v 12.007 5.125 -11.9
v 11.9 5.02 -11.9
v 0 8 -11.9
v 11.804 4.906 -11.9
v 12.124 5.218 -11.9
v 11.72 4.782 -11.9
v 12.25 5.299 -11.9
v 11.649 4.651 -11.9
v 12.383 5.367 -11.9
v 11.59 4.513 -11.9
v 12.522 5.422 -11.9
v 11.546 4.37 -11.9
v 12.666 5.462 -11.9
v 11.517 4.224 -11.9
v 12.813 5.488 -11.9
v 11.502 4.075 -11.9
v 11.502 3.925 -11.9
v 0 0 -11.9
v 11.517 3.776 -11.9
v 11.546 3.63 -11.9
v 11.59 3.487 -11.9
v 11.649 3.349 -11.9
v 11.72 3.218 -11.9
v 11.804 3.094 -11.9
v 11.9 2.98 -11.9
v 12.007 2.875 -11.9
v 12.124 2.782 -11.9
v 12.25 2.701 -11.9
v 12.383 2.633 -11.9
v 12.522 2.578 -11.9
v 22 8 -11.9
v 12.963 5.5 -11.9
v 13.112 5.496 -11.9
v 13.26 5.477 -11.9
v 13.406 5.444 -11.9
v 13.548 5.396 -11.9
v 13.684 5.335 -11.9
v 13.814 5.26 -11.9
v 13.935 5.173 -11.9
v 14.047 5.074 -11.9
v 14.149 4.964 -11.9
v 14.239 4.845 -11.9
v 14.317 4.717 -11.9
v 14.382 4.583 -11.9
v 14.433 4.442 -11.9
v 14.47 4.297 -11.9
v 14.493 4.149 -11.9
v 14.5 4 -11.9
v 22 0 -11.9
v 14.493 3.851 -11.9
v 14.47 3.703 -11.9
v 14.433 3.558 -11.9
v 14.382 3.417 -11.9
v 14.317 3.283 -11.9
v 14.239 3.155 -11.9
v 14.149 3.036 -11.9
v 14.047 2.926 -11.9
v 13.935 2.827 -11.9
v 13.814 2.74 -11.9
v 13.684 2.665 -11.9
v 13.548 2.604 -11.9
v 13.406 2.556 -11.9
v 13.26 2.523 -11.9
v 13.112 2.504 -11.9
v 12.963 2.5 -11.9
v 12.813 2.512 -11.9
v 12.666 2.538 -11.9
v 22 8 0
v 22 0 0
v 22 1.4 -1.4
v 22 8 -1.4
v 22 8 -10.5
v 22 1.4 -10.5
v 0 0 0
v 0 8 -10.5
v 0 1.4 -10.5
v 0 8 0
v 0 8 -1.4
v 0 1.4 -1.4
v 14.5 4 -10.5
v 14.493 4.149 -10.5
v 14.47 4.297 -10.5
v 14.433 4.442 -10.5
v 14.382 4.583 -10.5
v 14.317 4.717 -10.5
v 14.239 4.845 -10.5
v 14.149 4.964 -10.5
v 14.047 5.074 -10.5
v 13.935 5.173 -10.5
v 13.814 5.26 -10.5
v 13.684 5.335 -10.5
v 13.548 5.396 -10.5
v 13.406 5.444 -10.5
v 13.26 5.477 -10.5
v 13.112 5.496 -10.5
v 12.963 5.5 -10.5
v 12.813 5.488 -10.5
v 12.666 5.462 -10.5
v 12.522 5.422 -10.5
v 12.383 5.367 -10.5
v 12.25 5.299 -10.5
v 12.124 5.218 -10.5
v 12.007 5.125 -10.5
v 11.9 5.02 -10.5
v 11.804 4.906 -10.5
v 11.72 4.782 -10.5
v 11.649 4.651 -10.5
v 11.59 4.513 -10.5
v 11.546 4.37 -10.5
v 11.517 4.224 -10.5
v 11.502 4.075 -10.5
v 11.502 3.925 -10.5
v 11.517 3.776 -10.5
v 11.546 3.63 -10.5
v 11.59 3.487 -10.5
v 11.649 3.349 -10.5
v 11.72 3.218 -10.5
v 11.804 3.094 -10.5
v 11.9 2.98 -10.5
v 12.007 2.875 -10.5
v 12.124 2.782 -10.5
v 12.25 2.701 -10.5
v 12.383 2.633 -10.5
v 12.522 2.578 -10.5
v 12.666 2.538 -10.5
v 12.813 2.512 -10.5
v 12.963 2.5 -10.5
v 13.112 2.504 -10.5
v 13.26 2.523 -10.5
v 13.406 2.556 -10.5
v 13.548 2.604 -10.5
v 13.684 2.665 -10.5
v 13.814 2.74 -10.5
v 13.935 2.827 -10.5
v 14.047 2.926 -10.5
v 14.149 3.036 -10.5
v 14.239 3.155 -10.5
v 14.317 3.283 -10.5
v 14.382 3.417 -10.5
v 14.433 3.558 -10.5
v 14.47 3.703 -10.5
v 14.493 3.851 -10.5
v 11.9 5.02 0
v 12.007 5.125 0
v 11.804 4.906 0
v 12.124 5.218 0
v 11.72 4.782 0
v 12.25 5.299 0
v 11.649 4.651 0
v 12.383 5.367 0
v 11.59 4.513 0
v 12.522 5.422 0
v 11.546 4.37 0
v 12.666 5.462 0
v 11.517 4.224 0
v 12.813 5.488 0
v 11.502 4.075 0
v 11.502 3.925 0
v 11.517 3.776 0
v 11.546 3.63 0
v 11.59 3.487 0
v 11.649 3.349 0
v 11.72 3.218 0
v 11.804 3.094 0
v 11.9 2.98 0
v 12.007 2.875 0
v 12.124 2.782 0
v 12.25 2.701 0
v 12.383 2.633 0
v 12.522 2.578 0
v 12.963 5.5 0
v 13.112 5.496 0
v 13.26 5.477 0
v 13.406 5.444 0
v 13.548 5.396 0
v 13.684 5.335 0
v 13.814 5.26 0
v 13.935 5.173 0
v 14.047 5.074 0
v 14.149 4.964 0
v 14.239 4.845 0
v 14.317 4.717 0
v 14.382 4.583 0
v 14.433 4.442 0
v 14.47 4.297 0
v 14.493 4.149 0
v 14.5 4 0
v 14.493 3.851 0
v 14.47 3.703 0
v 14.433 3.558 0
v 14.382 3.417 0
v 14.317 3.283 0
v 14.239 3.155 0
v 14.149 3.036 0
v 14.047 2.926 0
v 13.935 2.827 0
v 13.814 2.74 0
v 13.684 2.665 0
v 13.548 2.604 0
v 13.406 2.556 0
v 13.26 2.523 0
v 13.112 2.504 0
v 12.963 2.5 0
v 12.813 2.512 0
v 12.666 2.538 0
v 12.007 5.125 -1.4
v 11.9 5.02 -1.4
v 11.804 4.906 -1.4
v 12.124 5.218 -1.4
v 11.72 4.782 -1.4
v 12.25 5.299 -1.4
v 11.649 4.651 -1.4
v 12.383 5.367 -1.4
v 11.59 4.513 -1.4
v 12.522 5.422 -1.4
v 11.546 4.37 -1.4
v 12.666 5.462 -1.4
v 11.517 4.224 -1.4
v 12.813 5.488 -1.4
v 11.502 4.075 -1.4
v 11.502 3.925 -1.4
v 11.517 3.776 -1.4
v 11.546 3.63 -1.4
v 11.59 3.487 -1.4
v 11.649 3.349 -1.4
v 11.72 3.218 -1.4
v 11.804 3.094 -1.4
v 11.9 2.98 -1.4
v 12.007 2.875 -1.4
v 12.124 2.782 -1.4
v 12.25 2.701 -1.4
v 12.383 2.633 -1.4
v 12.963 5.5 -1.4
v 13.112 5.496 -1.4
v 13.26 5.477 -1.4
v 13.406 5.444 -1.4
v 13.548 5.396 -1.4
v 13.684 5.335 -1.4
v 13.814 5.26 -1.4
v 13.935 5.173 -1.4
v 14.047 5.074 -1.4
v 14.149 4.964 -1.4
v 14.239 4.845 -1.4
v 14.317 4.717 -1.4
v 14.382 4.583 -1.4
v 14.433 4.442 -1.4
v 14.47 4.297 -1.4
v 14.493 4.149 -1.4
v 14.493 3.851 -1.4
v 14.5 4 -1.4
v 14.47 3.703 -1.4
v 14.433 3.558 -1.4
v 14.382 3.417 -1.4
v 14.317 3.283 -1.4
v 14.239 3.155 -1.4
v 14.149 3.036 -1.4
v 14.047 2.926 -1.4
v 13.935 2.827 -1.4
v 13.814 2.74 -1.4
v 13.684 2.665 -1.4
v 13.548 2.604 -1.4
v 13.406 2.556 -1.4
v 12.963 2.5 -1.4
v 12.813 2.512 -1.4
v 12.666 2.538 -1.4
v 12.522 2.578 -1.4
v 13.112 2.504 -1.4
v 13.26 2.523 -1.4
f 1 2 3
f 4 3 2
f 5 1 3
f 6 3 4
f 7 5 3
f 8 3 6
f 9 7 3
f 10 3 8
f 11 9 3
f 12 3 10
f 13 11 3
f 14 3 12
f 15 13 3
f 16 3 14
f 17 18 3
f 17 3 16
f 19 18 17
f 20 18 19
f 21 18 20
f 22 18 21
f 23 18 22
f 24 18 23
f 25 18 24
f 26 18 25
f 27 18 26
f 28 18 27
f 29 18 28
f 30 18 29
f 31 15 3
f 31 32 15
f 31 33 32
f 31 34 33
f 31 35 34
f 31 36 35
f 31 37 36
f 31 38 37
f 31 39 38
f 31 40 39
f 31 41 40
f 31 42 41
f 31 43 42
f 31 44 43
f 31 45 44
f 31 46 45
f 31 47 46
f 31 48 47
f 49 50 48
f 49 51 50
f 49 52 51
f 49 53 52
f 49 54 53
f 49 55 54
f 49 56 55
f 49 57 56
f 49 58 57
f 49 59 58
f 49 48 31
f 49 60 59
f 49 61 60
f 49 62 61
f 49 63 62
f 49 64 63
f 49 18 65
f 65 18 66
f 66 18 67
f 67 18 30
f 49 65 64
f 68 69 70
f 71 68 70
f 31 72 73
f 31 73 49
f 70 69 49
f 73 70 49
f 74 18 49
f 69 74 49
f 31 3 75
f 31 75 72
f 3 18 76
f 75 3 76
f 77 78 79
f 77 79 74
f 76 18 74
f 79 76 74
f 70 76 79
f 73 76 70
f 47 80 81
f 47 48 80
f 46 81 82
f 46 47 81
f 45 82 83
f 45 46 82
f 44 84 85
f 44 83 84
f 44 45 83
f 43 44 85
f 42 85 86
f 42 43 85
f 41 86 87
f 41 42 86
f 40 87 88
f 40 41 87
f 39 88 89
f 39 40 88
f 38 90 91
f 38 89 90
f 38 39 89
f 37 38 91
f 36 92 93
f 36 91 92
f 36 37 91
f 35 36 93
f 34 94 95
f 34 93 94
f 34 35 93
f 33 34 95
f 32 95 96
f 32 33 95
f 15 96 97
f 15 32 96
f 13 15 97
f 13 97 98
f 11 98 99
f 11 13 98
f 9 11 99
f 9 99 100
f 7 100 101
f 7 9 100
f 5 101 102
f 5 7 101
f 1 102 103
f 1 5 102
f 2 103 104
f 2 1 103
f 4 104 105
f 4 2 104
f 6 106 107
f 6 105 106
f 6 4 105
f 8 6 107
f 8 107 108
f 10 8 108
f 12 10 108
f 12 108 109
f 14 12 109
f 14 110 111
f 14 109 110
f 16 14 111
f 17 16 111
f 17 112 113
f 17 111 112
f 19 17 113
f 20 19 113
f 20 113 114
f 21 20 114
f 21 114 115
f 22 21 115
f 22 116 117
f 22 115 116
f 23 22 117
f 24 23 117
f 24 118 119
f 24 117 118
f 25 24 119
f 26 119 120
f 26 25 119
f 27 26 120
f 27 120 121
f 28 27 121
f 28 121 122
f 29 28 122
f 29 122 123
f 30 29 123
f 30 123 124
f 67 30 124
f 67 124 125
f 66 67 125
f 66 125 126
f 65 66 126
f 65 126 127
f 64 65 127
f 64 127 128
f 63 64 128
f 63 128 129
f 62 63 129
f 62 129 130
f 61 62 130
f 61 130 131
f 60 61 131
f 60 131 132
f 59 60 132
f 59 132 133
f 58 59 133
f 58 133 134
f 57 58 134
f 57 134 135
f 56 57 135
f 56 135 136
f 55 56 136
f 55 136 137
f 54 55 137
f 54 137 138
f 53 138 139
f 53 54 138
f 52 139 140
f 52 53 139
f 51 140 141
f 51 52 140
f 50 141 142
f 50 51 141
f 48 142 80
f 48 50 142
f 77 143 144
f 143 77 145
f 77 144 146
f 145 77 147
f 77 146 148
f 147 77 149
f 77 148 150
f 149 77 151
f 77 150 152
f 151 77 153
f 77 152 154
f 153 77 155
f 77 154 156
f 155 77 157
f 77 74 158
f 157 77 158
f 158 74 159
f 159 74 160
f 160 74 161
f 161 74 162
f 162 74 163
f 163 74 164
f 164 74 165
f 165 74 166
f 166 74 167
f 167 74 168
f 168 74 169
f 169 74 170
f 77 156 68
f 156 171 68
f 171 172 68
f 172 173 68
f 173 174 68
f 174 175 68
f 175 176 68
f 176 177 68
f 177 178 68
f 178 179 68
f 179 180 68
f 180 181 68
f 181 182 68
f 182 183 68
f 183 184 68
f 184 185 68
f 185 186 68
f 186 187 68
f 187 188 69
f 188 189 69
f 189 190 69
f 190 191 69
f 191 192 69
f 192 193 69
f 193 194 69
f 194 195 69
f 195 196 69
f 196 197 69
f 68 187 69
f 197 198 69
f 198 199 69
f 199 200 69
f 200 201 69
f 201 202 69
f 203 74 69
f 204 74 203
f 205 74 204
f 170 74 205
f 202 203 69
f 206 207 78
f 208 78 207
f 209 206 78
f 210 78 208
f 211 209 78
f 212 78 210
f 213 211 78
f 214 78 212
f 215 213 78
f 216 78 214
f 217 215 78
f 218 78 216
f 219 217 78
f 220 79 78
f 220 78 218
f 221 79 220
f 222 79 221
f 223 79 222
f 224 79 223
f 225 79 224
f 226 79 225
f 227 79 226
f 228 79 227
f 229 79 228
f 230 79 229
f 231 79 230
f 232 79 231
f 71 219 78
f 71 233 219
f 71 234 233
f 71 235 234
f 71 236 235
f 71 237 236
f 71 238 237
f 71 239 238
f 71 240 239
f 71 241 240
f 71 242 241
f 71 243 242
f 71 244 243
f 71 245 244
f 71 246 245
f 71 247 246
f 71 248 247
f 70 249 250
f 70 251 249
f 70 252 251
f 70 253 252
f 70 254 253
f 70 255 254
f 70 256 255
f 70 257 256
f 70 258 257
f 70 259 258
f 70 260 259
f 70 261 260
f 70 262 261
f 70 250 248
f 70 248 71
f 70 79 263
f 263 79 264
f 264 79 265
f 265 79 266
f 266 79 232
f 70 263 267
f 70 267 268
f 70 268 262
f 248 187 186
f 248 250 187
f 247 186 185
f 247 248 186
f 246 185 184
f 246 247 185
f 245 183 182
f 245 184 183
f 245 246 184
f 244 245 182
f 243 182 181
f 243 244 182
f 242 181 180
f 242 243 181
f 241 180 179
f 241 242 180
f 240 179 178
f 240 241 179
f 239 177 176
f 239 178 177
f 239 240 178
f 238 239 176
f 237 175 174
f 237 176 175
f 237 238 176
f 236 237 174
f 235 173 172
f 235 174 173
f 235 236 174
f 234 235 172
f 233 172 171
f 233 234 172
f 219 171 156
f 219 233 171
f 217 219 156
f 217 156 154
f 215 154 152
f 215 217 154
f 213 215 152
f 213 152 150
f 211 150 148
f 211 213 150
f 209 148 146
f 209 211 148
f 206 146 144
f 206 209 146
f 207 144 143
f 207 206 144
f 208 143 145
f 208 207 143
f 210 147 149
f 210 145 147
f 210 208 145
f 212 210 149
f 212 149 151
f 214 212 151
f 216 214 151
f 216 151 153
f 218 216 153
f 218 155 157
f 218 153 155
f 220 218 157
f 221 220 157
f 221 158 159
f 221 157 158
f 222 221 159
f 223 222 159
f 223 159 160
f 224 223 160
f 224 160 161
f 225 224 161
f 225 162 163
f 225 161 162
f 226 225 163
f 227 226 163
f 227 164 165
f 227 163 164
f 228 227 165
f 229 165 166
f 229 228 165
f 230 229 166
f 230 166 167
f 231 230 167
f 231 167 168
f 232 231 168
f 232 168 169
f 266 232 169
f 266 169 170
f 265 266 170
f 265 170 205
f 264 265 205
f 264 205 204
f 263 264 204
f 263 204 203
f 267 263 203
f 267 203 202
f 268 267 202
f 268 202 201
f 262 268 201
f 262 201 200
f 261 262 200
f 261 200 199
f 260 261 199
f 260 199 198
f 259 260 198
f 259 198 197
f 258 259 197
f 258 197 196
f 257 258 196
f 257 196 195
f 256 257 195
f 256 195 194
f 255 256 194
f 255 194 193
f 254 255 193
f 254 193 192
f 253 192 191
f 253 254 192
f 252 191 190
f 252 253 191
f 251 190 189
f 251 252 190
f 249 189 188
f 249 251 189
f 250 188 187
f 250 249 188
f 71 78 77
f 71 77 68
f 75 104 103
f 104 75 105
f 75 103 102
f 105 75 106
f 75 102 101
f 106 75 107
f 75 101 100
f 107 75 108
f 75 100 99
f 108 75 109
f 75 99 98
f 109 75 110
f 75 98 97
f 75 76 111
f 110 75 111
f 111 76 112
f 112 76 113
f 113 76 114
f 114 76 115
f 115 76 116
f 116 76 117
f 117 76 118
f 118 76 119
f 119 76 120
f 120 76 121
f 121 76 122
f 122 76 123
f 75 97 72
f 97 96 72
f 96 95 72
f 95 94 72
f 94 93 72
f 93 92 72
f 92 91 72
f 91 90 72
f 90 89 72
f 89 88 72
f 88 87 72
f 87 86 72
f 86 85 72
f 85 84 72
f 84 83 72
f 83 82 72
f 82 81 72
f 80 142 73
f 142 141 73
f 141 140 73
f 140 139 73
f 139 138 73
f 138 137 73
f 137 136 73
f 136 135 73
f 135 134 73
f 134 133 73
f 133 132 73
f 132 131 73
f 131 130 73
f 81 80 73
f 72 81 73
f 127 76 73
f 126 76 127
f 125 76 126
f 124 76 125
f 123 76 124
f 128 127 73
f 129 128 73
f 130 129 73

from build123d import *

# Parameters (mm, degrees)
SKETCH_1_W               = 22
SKETCH_1_H               = 11.9
BOTTOM_DEPTH             = 1.4
SKETCH_1_3_W             = 22
SKETCH_1_3_H             = 1.4
EXTRUDE_2_DEPTH          = 8
CUT_EXTRUDE_1_DEPTH      = 27.260426501
CUT_EXTRUDE_1_DEPTH_BACK = 27.260426501
SKETCH_2_R               = 1.5


with BuildPart() as part:
    # Эскиз1 → Bottom (new body)
    with BuildSketch(Plane(origin=(0, 0, 0), x_dir=(1, 0, 0), z_dir=(0, 1, 0))):
        with Locations((11, 5.95)):
            Rectangle(SKETCH_1_W, SKETCH_1_H)
    extrude(amount=BOTTOM_DEPTH)

    # Эскиз1<3> → Бобышка-Вытянуть2 (add)
    with BuildSketch(Plane(origin=(0, 0, 0), x_dir=(1, 0, 0), z_dir=(0, 1, 0))):
        with Locations((11, 11.2)):
            Rectangle(SKETCH_1_3_W, SKETCH_1_3_H)
        with Locations((11, 0.7)):
            Rectangle(SKETCH_1_3_W, SKETCH_1_3_H)
    extrude(amount=EXTRUDE_2_DEPTH)

    # Эскиз2 → Вырез-Вытянуть1 (cut, two sides: drawn at the far end of the back side and taken through both)
    with BuildSketch(Plane.XY.offset(-CUT_EXTRUDE_1_DEPTH_BACK)):
        with Locations((13, 4)):
            Circle(SKETCH_2_R)
    extrude(amount=CUT_EXTRUDE_1_DEPTH + CUT_EXTRUDE_1_DEPTH_BACK, mode=Mode.SUBTRACT)


solid = part.part
